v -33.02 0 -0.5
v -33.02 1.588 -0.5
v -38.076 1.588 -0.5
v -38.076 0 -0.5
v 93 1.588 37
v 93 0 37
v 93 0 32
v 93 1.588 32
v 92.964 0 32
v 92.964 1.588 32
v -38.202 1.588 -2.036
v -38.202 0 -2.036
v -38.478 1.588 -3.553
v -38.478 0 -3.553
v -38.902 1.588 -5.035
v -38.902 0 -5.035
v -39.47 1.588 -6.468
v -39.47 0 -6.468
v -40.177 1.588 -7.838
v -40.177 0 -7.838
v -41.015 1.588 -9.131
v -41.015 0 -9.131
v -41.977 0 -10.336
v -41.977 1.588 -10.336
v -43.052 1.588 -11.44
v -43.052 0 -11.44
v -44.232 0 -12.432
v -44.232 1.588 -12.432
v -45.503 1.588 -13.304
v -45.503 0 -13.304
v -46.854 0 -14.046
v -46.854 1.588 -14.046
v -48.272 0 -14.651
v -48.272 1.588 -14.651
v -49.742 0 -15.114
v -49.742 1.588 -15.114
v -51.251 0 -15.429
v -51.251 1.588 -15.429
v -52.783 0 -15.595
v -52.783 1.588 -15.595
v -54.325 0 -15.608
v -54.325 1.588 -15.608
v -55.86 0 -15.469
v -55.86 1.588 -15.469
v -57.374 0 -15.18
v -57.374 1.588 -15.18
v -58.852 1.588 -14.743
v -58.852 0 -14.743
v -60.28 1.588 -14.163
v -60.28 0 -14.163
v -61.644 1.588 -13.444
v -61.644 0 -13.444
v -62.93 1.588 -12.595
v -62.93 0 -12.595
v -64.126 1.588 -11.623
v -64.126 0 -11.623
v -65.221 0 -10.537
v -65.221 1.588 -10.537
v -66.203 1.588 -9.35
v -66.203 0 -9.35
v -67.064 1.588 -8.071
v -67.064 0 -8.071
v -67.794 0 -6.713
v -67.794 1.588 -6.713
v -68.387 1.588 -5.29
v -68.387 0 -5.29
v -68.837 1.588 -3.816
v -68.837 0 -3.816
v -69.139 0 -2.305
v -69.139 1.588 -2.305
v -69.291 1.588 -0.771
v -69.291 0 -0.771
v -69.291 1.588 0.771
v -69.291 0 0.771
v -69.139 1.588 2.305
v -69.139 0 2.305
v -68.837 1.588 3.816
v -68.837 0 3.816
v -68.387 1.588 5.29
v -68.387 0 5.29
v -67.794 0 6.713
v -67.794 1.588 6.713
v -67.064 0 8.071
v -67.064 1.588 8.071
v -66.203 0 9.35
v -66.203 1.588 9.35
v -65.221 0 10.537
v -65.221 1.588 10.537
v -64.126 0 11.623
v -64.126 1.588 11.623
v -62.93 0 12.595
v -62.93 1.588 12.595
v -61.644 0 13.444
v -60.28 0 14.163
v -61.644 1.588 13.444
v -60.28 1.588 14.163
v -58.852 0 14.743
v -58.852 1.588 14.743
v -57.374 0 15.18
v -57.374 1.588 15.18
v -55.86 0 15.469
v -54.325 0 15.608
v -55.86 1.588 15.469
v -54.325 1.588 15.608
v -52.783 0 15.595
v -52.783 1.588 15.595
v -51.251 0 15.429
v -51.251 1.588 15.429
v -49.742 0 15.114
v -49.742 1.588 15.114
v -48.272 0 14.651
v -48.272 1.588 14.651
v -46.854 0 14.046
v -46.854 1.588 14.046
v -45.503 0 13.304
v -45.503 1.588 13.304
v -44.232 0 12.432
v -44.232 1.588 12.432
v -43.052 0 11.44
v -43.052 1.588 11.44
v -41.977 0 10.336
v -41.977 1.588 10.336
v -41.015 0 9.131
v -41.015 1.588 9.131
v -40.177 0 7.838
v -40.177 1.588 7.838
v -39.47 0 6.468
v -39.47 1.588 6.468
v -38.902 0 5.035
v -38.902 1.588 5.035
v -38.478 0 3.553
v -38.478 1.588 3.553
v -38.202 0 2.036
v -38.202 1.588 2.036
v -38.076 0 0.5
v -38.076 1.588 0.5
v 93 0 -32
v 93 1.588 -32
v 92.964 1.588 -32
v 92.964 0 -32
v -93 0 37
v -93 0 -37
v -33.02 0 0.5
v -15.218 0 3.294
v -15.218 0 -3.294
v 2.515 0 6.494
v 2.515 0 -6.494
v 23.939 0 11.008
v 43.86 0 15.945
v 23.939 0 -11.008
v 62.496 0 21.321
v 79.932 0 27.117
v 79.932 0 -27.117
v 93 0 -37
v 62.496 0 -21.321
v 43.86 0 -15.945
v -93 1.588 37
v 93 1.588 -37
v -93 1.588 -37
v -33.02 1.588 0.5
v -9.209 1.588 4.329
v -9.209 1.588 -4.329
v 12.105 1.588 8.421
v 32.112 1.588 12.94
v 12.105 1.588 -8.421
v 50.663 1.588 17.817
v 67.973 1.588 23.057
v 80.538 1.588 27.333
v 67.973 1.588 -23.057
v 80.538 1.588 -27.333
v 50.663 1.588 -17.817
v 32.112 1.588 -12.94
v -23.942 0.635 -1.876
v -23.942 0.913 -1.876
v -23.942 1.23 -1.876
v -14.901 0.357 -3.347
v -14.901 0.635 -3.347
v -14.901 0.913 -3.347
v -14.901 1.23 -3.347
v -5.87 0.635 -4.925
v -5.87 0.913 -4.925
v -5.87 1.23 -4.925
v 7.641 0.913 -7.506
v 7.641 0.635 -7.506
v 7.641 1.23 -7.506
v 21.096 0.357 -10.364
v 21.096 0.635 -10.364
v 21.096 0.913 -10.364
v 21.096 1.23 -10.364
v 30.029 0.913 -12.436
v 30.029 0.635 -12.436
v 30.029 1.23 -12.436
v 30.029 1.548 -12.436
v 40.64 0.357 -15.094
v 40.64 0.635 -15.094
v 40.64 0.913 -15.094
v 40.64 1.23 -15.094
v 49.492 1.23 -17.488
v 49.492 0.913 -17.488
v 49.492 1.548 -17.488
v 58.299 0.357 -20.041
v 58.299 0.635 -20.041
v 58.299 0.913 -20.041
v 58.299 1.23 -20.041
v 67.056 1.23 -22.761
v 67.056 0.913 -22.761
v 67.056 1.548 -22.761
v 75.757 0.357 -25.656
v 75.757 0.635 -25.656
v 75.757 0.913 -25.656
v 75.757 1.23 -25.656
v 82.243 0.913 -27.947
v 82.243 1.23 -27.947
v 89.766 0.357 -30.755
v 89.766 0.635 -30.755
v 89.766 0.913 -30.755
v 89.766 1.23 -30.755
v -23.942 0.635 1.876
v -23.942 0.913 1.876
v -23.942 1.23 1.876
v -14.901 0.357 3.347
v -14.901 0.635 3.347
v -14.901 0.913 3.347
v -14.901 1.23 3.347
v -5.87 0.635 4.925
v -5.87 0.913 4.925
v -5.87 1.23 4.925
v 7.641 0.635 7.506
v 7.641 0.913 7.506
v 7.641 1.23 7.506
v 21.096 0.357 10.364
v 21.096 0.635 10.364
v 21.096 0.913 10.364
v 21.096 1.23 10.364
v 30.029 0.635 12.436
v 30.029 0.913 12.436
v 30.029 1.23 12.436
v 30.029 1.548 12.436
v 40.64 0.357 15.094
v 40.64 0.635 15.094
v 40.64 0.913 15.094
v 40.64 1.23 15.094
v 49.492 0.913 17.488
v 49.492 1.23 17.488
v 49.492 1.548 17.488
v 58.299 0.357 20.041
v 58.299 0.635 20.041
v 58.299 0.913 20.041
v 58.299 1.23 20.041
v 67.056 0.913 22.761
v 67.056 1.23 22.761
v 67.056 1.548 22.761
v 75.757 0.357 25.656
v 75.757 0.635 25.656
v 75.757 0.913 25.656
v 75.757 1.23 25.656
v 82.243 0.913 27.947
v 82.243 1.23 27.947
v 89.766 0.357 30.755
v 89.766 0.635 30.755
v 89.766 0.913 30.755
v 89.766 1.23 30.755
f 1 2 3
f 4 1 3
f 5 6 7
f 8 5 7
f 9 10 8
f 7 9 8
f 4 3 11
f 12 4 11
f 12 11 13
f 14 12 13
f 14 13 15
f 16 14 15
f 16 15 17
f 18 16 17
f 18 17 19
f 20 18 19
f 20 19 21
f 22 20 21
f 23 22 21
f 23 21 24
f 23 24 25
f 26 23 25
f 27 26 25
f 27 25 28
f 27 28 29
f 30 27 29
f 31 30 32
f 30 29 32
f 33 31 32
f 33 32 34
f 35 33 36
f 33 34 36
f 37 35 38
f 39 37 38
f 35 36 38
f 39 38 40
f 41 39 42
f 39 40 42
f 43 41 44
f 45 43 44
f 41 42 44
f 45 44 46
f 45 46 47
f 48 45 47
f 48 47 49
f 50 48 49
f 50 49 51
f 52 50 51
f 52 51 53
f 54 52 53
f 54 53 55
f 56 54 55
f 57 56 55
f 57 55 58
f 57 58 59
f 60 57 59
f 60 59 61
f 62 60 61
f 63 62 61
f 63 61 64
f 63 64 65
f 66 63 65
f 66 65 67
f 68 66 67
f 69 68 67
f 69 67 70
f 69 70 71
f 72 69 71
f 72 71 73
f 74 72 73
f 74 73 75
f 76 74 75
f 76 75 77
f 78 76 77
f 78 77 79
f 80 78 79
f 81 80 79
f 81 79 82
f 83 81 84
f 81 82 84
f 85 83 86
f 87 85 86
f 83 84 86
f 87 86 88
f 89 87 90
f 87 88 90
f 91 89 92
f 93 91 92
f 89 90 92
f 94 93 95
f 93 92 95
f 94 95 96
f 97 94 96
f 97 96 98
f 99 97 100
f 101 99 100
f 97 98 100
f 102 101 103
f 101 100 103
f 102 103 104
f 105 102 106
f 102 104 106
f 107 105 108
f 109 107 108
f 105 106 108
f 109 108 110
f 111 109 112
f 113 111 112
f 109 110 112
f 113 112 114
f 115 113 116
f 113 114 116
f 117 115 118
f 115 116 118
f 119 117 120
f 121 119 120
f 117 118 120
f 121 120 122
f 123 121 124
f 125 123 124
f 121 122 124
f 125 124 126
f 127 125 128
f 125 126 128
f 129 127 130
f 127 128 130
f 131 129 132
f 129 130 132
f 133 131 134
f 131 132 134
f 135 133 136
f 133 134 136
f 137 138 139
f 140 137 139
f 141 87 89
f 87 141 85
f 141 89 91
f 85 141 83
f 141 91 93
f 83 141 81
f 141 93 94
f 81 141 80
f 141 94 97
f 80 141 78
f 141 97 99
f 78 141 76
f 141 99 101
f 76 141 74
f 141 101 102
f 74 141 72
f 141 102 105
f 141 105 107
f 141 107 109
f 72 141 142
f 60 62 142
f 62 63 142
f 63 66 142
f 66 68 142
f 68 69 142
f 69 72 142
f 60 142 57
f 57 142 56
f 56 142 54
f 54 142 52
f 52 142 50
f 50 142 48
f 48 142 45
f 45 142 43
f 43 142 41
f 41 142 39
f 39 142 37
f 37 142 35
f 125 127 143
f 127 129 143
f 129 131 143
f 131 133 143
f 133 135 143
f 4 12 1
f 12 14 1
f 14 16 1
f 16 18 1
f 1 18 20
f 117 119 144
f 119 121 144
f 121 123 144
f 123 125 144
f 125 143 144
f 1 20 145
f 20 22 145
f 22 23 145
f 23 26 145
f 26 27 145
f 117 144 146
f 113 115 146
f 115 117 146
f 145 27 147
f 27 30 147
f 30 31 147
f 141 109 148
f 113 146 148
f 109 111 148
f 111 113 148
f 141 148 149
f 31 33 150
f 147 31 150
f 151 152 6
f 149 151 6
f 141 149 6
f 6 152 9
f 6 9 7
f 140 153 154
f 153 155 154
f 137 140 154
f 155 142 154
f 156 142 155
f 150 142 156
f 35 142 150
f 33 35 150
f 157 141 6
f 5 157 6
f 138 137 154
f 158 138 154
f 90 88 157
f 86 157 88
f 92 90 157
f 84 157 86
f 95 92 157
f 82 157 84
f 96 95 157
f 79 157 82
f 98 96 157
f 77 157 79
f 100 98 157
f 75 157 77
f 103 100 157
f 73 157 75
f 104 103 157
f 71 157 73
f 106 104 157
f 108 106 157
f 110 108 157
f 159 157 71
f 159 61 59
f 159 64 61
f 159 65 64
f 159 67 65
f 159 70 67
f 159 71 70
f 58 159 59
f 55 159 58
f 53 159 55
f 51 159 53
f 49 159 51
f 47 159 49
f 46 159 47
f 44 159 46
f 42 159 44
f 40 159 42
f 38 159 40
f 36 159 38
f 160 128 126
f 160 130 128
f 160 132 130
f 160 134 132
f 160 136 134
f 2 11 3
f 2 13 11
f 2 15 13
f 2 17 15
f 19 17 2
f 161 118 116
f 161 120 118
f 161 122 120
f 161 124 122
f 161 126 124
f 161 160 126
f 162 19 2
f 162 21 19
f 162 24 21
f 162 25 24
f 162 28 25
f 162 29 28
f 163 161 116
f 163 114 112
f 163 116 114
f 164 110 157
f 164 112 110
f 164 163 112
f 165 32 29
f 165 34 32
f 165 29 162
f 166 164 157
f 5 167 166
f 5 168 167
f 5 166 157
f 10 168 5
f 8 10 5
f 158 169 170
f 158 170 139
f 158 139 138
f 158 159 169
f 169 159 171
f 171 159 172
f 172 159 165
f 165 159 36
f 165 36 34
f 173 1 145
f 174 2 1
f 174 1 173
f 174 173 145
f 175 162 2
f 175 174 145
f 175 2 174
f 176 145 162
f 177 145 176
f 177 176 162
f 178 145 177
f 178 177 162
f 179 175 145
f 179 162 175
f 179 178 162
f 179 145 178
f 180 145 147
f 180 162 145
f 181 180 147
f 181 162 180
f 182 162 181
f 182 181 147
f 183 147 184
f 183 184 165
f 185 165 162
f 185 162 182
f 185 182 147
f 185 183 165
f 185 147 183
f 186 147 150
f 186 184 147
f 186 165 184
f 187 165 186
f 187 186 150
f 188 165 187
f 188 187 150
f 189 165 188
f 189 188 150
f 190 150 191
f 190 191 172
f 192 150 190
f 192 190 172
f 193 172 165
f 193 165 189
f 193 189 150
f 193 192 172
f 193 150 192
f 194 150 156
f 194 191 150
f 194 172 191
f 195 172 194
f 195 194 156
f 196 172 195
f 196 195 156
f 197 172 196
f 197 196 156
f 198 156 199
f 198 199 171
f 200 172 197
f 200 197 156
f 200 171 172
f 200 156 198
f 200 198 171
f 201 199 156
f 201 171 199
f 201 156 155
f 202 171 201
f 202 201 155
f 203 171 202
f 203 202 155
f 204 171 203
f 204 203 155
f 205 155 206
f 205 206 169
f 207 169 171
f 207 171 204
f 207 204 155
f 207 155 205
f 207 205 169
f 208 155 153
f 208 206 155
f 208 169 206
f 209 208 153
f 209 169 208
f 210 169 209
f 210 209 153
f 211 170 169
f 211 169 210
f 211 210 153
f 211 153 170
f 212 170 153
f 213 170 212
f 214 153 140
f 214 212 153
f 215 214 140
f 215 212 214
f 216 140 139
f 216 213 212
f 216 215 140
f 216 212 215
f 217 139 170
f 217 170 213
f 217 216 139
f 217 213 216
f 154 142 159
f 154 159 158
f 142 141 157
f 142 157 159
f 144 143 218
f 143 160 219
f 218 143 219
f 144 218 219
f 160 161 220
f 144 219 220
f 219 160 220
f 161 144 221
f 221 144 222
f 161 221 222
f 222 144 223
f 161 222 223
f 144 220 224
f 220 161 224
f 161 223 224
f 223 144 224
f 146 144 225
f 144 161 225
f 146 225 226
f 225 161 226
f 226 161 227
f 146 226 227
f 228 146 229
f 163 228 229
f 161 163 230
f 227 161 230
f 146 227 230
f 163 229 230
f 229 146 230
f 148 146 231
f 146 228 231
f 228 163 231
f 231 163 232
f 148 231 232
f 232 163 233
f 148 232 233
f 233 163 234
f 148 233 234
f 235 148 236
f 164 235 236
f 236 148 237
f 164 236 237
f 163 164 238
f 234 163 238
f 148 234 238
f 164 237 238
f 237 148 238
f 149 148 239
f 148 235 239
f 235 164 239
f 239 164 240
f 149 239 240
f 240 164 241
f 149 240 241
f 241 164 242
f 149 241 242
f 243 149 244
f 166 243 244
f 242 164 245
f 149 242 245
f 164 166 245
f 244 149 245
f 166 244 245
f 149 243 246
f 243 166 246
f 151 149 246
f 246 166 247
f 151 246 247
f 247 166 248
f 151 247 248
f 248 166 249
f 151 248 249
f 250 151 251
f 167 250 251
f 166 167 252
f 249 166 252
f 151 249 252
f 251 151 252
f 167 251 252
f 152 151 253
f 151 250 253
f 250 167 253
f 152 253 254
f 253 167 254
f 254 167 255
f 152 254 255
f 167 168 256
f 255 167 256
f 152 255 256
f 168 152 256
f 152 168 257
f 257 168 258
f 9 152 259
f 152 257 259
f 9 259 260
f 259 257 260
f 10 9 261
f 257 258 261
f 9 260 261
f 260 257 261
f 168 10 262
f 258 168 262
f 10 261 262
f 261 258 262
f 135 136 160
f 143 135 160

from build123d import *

# Parameters (mm, degrees)
SKETCH1_W           = 185.999882
SKETCH1_H           = 74.000106
BOSS_EXTRUDE3_DEPTH = 1.5875
CUT_EXTRUDE3_DEPTH  = 2.54


with BuildPart() as part:
    # Sketch1 → Boss-Extrude3 (new body)
    with BuildSketch(Plane(origin=(0, 0, 0), x_dir=(1, 0, 0), z_dir=(0, 1, 0))):
        Rectangle(SKETCH1_W, SKETCH1_H)
    extrude(amount=BOSS_EXTRUDE3_DEPTH)

    # Sketch4 → Cut-Extrude3 (cut)
    with BuildSketch(Plane(origin=(0, 1.5875, 0), x_dir=(1, 0, 0), z_dir=(0, 1, 0))):
        with BuildLine():
            Line((-33.019999998, 0.499998888), (-38.076346482, 0.499998888))
            ThreePointArc((-38.076346482, 0.499998888), (-69.310342417, -8.5e-08), (-38.076346479, -0.499998888))
            Line((-38.076346479, -0.499998888), (-33.019999997, -0.499998888))
            add(Edge.make_bspline(
                [(-33.019999997, -0.499998888), (-32.54632499, -0.569245934), (-31.586035731, -0.710618844), (-29.370983979, -1.038906843), (-27.495063328, -1.325179383), (-25.000131636, -1.708121039), (-22.872397946, -2.043660099), (-20.526372341, -2.417494507), (-18.312405788, -2.778512003), (-16.022726377, -3.157194229), (-13.776510299, -3.536227287), (-10.945442388, -4.021942901), (-6.433516708, -4.814957325), (-1.356746681, -5.744470681), (4.270229912, -6.82483512), (11.013466622, -8.182339851), (16.620878036, -9.365479808), (22.217465189, -10.603163227), (28.231300592, -11.997433679), (33.11855172, -13.176234287), (37.994608625, -14.399821142), (42.858903514, -15.669688211), (47.285116507, -16.866229097), (51.7005538, -18.102139295), (56.104457025, -19.378378553), (59.947265614, -20.531258809), (63.232966999, -21.545846418), (65.965538205, -22.409292492), (68.147965495, -23.110854225), (70.871921061, -24.001687113), (73.589095471, -24.910758606), (76.029944312, -25.746275579), (78.193394279, -26.501694312), (79.81619039, -27.074902775), (81.432049585, -27.651976873), (83.324431409, -28.337781593), (85.465097243, -29.126327671), (87.359843247, -29.836757063), (88.94155129, -30.437597441), (90.322203412, -30.968739967), (91.291423843, -31.343800626), (92.282484454, -31.731855507), (92.741323404, -31.912151608), (92.964000003, -31.999935633)],
                knots=[0.081631279, 0.081631279, 0.081631279, 0.081631279, 0.081631279, 0.096343802, 0.111056325, 0.125768848, 0.140481371, 0.155193894, 0.169906418, 0.184618941, 0.199331464, 0.214043988, 0.228756511, 0.258181558, 0.31703165, 0.346456696, 0.375881743, 0.434731835, 0.464156881, 0.493581928, 0.534357317, 0.563782355, 0.593207404, 0.622632455, 0.652057492, 0.681482549, 0.710907585, 0.725620111, 0.740332636, 0.755045164, 0.769757692, 0.799182725, 0.813895254, 0.821251518, 0.828607782, 0.843320301, 0.858032821, 0.872745338, 0.887457856, 0.894814124, 0.902170393, 0.909526661, 0.91688293, 0.91688293, 0.91688293, 0.91688293, 0.91688293], degree=4))
            Line((92.964000003, -31.999935633), (94.190773048, -31.999935633))
            Line((94.190773048, -31.999935633), (94.190773048, 31.999935633))
            Line((94.190773048, 31.999935633), (92.964000001, 31.999935633))
            add(Edge.make_bspline(
                [(-33.019999998, 0.499998888), (-32.546324991, 0.569245934), (-31.586035733, 0.710618844), (-29.37098398, 1.038906842), (-27.495063329, 1.325179382), (-25.000131637, 1.708121039), (-22.872397948, 2.043660099), (-20.526372343, 2.417494507), (-18.312405789, 2.778512003), (-16.022726379, 3.157194229), (-13.7765103, 3.536227286), (-10.94544239, 4.021942901), (-6.433516709, 4.814957324), (-1.356746682, 5.744470681), (4.27022991, 6.82483512), (11.01346662, 8.182339851), (16.620878035, 9.365479808), (22.217465188, 10.603163227), (28.231300591, 11.997433679), (33.118551718, 13.176234287), (37.994608623, 14.399821142), (42.858903512, 15.669688211), (47.285116506, 16.866229097), (51.700553798, 18.102139295), (56.104457023, 19.378378554), (59.947265613, 20.531258809), (63.232966997, 21.545846418), (65.965538204, 22.409292493), (68.147965493, 23.110854225), (70.87192106, 24.001687113), (73.58909547, 24.910758606), (76.02994431, 25.746275579), (78.193394278, 26.501694312), (79.816190388, 27.074902775), (81.432049584, 27.651976873), (83.324431408, 28.337781594), (85.465097241, 29.126327672), (87.359843245, 29.836757063), (88.941551288, 30.437597442), (90.322203411, 30.968739967), (91.291423842, 31.343800626), (92.282484452, 31.731855507), (92.741323403, 31.912151608), (92.964000001, 31.999935633)],
                knots=[0.081631279, 0.081631279, 0.081631279, 0.081631279, 0.081631279, 0.096343802, 0.111056325, 0.125768848, 0.140481371, 0.155193894, 0.169906418, 0.184618941, 0.199331464, 0.214043988, 0.228756511, 0.258181558, 0.31703165, 0.346456696, 0.375881743, 0.434731835, 0.464156881, 0.493581928, 0.534357317, 0.563782355, 0.593207404, 0.622632455, 0.652057492, 0.681482549, 0.710907585, 0.725620111, 0.740332636, 0.755045164, 0.769757692, 0.799182725, 0.813895254, 0.821251518, 0.828607782, 0.843320301, 0.858032821, 0.872745338, 0.887457856, 0.894814124, 0.902170393, 0.909526661, 0.91688293, 0.91688293, 0.91688293, 0.91688293, 0.91688293], degree=4))
        make_face()
    extrude(amount=-CUT_EXTRUDE3_DEPTH, mode=Mode.SUBTRACT)


solid = part.part
